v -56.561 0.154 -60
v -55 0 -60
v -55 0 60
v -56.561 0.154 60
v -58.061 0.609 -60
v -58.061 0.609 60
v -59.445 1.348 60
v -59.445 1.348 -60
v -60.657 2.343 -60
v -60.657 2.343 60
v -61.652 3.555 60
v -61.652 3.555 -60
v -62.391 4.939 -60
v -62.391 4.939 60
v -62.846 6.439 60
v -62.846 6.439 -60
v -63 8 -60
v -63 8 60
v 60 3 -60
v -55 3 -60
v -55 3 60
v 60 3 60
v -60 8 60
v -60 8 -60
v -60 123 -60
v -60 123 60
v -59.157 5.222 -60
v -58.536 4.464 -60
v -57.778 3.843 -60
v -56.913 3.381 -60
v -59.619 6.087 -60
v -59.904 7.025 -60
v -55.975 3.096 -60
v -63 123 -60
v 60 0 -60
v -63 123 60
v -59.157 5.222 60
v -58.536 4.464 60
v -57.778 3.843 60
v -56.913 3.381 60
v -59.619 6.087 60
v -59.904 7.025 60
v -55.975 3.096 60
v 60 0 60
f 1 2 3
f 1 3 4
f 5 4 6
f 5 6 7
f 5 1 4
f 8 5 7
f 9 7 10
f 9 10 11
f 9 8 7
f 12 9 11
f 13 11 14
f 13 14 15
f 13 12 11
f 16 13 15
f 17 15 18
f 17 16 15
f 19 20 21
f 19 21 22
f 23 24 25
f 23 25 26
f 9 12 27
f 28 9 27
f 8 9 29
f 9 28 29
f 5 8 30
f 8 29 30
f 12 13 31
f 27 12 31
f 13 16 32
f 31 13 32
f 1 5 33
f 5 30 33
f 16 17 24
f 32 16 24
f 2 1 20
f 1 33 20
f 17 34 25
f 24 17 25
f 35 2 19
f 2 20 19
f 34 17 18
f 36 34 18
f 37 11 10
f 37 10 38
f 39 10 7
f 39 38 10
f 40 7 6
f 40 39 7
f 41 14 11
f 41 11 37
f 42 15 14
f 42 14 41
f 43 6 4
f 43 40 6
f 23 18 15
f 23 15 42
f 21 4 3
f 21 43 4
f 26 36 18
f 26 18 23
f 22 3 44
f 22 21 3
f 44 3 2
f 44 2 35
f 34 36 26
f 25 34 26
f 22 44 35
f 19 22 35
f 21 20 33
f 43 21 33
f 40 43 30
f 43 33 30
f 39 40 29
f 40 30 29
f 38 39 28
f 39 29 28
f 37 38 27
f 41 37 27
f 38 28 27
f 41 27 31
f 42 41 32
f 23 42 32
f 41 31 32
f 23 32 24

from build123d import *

# Parameters (mm, degrees)
SKETCH1_W              = 120
SKETCH1_H              = 120
BOSS_EXTRUDE1_DEPTH    = 3
SKETCH2_W              = 3
SKETCH2_H              = 120
BOSS_EXTRUDE2_DEPTH    = 123
CONVERT_SOLID2_START   = -60
CONVERT_SOLID2_DEPTH   = 120
CONVERT_SOLID2_2_DEPTH = 120


# Read off the part's stored shape, not the designer's step: Convert-Solid2
with BuildPart() as part:
    # Sketch1 → Boss-Extrude1 (new body)
    with BuildSketch(Plane(origin=(0, 0, 0), x_dir=(1, 0, 0), z_dir=(0, 1, 0))):
        Rectangle(SKETCH1_W, SKETCH1_H)
    extrude(amount=BOSS_EXTRUDE1_DEPTH)

    # Sketch2 → Boss-Extrude2 (add)
    with BuildSketch(Plane.XZ):
        with Locations((-61.5, 0)):
            Rectangle(SKETCH2_W, SKETCH2_H)
    extrude(amount=-BOSS_EXTRUDE2_DEPTH)

    # Convert-Solid2 outline → Convert-Solid2 (cut)
    with BuildSketch(Plane.XY.offset(CONVERT_SOLID2_START)):
        with BuildLine():
            Line((-63, 0), (-55, 0))
            ThreePointArc((-55, 0), (-60.656854249, 2.343145751), (-63, 8))
            Line((-63, 8), (-63, 0))
        make_face()
    extrude(amount=CONVERT_SOLID2_DEPTH, mode=Mode.SUBTRACT)

    # Convert-Solid2 2 outline → Convert-Solid2 2 (add)
    with BuildSketch(Plane.XY.offset(CONVERT_SOLID2_START)):
        with BuildLine():
            Line((-60, 3), (-55, 3))
            ThreePointArc((-55, 3), (-58.535533906, 4.464466094), (-60, 8))
            Line((-60, 8), (-60, 3))
        make_face()
    extrude(amount=CONVERT_SOLID2_2_DEPTH)


solid = part.part
